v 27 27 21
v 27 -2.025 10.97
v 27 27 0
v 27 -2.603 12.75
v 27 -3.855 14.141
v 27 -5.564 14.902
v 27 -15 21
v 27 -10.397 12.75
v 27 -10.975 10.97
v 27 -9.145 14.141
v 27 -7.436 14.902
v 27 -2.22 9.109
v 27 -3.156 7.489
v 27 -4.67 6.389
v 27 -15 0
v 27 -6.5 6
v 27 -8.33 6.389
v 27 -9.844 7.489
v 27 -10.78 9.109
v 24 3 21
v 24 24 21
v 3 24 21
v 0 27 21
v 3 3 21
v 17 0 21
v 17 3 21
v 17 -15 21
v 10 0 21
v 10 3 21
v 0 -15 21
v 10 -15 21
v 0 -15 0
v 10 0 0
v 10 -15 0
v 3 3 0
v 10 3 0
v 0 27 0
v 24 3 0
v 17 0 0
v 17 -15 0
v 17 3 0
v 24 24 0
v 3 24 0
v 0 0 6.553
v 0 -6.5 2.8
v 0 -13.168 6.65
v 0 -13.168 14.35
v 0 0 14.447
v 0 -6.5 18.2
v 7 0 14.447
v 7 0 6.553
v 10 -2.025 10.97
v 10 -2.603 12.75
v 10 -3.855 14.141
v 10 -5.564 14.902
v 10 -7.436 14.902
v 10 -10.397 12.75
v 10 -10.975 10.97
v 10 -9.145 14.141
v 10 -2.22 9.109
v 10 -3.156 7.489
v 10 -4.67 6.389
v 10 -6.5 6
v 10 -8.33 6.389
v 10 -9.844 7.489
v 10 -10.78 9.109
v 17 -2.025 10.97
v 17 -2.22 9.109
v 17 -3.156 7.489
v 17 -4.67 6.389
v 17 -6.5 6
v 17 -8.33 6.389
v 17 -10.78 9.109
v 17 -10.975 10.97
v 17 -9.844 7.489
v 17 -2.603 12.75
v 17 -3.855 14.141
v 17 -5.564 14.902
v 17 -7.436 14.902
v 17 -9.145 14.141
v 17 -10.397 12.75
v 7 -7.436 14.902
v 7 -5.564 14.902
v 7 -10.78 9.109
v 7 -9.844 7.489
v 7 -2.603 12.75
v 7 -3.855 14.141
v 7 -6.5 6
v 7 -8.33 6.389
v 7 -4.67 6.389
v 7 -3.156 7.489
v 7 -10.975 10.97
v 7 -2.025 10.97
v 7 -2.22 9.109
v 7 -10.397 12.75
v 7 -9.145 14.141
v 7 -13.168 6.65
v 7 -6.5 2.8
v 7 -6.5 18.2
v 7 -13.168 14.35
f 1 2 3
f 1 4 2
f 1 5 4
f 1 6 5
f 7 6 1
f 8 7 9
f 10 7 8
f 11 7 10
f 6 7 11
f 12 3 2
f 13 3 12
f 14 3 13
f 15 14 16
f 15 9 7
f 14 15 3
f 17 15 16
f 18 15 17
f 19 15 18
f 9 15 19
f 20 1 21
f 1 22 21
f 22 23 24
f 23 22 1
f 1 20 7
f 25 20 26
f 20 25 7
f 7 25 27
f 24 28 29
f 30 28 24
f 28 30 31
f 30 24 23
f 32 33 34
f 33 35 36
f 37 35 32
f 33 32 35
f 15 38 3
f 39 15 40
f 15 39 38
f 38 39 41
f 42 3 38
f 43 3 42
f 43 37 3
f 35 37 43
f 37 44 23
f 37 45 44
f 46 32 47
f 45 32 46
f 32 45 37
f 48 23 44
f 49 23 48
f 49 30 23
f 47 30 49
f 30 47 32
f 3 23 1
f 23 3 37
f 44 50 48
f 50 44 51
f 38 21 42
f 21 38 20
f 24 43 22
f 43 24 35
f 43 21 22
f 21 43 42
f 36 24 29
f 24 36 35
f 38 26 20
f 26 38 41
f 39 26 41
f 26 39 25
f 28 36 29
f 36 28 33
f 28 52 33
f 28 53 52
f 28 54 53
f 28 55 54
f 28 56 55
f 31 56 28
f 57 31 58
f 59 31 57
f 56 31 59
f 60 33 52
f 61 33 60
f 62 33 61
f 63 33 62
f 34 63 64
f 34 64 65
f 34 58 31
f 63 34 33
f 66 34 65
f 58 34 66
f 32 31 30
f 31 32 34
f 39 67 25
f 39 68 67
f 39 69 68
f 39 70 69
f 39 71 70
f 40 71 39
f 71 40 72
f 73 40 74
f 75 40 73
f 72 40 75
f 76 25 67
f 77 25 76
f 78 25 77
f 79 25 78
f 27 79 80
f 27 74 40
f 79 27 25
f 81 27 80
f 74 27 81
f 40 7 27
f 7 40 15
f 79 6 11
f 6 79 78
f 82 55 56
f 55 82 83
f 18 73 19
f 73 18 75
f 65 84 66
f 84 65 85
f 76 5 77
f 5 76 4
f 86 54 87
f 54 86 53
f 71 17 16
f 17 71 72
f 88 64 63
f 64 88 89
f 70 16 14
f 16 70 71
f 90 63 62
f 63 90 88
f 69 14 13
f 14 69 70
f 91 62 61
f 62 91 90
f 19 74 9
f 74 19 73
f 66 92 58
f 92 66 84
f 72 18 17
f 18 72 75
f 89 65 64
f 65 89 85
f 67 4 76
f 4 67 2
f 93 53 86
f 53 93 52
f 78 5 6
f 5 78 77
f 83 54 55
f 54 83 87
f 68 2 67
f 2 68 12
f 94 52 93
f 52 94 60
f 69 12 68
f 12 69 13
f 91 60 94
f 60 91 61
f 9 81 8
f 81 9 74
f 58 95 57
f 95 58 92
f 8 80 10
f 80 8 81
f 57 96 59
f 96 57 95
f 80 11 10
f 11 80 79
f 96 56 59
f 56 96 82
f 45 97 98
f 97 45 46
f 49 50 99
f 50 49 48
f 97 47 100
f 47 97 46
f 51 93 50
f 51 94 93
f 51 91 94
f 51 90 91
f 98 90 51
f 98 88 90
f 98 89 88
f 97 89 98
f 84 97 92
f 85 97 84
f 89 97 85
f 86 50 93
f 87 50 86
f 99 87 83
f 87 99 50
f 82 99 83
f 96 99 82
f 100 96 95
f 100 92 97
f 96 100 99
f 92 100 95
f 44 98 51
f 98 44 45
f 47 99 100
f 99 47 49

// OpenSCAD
/*
    created 10 Jan 2021
    by Matt Jones (Crazy-Logic)  

    This example code is in the public domain.
    
    This is for clamping to a 20mm t-slot extrusion, using a 35mm M8 bolt and wing nut/leaver. 
*/

$d = 21;



difference(){
    cube([$d+6,$d+6,$d]);
    translate([3,3,0])
    cube([$d,$d,$d]);
    translate([10,0,0])
    cube([$d-20+6,3,$d]);
}


difference(){
    union(){
    translate([0,-15,0])
    cube([10,15,$d]);
    translate([$d-10+6,-15,0])
    cube([10,15,$d]);
    }
    
    translate([0,-6.5,$d/2])
    rotate([0,90,0])
    cylinder(h=$d+6, r=4.5);
    
    translate([0,-6.5,$d/2])
    rotate([0,90,0])
    cylinder(h=7, r=7.7, $fn=6);
}
